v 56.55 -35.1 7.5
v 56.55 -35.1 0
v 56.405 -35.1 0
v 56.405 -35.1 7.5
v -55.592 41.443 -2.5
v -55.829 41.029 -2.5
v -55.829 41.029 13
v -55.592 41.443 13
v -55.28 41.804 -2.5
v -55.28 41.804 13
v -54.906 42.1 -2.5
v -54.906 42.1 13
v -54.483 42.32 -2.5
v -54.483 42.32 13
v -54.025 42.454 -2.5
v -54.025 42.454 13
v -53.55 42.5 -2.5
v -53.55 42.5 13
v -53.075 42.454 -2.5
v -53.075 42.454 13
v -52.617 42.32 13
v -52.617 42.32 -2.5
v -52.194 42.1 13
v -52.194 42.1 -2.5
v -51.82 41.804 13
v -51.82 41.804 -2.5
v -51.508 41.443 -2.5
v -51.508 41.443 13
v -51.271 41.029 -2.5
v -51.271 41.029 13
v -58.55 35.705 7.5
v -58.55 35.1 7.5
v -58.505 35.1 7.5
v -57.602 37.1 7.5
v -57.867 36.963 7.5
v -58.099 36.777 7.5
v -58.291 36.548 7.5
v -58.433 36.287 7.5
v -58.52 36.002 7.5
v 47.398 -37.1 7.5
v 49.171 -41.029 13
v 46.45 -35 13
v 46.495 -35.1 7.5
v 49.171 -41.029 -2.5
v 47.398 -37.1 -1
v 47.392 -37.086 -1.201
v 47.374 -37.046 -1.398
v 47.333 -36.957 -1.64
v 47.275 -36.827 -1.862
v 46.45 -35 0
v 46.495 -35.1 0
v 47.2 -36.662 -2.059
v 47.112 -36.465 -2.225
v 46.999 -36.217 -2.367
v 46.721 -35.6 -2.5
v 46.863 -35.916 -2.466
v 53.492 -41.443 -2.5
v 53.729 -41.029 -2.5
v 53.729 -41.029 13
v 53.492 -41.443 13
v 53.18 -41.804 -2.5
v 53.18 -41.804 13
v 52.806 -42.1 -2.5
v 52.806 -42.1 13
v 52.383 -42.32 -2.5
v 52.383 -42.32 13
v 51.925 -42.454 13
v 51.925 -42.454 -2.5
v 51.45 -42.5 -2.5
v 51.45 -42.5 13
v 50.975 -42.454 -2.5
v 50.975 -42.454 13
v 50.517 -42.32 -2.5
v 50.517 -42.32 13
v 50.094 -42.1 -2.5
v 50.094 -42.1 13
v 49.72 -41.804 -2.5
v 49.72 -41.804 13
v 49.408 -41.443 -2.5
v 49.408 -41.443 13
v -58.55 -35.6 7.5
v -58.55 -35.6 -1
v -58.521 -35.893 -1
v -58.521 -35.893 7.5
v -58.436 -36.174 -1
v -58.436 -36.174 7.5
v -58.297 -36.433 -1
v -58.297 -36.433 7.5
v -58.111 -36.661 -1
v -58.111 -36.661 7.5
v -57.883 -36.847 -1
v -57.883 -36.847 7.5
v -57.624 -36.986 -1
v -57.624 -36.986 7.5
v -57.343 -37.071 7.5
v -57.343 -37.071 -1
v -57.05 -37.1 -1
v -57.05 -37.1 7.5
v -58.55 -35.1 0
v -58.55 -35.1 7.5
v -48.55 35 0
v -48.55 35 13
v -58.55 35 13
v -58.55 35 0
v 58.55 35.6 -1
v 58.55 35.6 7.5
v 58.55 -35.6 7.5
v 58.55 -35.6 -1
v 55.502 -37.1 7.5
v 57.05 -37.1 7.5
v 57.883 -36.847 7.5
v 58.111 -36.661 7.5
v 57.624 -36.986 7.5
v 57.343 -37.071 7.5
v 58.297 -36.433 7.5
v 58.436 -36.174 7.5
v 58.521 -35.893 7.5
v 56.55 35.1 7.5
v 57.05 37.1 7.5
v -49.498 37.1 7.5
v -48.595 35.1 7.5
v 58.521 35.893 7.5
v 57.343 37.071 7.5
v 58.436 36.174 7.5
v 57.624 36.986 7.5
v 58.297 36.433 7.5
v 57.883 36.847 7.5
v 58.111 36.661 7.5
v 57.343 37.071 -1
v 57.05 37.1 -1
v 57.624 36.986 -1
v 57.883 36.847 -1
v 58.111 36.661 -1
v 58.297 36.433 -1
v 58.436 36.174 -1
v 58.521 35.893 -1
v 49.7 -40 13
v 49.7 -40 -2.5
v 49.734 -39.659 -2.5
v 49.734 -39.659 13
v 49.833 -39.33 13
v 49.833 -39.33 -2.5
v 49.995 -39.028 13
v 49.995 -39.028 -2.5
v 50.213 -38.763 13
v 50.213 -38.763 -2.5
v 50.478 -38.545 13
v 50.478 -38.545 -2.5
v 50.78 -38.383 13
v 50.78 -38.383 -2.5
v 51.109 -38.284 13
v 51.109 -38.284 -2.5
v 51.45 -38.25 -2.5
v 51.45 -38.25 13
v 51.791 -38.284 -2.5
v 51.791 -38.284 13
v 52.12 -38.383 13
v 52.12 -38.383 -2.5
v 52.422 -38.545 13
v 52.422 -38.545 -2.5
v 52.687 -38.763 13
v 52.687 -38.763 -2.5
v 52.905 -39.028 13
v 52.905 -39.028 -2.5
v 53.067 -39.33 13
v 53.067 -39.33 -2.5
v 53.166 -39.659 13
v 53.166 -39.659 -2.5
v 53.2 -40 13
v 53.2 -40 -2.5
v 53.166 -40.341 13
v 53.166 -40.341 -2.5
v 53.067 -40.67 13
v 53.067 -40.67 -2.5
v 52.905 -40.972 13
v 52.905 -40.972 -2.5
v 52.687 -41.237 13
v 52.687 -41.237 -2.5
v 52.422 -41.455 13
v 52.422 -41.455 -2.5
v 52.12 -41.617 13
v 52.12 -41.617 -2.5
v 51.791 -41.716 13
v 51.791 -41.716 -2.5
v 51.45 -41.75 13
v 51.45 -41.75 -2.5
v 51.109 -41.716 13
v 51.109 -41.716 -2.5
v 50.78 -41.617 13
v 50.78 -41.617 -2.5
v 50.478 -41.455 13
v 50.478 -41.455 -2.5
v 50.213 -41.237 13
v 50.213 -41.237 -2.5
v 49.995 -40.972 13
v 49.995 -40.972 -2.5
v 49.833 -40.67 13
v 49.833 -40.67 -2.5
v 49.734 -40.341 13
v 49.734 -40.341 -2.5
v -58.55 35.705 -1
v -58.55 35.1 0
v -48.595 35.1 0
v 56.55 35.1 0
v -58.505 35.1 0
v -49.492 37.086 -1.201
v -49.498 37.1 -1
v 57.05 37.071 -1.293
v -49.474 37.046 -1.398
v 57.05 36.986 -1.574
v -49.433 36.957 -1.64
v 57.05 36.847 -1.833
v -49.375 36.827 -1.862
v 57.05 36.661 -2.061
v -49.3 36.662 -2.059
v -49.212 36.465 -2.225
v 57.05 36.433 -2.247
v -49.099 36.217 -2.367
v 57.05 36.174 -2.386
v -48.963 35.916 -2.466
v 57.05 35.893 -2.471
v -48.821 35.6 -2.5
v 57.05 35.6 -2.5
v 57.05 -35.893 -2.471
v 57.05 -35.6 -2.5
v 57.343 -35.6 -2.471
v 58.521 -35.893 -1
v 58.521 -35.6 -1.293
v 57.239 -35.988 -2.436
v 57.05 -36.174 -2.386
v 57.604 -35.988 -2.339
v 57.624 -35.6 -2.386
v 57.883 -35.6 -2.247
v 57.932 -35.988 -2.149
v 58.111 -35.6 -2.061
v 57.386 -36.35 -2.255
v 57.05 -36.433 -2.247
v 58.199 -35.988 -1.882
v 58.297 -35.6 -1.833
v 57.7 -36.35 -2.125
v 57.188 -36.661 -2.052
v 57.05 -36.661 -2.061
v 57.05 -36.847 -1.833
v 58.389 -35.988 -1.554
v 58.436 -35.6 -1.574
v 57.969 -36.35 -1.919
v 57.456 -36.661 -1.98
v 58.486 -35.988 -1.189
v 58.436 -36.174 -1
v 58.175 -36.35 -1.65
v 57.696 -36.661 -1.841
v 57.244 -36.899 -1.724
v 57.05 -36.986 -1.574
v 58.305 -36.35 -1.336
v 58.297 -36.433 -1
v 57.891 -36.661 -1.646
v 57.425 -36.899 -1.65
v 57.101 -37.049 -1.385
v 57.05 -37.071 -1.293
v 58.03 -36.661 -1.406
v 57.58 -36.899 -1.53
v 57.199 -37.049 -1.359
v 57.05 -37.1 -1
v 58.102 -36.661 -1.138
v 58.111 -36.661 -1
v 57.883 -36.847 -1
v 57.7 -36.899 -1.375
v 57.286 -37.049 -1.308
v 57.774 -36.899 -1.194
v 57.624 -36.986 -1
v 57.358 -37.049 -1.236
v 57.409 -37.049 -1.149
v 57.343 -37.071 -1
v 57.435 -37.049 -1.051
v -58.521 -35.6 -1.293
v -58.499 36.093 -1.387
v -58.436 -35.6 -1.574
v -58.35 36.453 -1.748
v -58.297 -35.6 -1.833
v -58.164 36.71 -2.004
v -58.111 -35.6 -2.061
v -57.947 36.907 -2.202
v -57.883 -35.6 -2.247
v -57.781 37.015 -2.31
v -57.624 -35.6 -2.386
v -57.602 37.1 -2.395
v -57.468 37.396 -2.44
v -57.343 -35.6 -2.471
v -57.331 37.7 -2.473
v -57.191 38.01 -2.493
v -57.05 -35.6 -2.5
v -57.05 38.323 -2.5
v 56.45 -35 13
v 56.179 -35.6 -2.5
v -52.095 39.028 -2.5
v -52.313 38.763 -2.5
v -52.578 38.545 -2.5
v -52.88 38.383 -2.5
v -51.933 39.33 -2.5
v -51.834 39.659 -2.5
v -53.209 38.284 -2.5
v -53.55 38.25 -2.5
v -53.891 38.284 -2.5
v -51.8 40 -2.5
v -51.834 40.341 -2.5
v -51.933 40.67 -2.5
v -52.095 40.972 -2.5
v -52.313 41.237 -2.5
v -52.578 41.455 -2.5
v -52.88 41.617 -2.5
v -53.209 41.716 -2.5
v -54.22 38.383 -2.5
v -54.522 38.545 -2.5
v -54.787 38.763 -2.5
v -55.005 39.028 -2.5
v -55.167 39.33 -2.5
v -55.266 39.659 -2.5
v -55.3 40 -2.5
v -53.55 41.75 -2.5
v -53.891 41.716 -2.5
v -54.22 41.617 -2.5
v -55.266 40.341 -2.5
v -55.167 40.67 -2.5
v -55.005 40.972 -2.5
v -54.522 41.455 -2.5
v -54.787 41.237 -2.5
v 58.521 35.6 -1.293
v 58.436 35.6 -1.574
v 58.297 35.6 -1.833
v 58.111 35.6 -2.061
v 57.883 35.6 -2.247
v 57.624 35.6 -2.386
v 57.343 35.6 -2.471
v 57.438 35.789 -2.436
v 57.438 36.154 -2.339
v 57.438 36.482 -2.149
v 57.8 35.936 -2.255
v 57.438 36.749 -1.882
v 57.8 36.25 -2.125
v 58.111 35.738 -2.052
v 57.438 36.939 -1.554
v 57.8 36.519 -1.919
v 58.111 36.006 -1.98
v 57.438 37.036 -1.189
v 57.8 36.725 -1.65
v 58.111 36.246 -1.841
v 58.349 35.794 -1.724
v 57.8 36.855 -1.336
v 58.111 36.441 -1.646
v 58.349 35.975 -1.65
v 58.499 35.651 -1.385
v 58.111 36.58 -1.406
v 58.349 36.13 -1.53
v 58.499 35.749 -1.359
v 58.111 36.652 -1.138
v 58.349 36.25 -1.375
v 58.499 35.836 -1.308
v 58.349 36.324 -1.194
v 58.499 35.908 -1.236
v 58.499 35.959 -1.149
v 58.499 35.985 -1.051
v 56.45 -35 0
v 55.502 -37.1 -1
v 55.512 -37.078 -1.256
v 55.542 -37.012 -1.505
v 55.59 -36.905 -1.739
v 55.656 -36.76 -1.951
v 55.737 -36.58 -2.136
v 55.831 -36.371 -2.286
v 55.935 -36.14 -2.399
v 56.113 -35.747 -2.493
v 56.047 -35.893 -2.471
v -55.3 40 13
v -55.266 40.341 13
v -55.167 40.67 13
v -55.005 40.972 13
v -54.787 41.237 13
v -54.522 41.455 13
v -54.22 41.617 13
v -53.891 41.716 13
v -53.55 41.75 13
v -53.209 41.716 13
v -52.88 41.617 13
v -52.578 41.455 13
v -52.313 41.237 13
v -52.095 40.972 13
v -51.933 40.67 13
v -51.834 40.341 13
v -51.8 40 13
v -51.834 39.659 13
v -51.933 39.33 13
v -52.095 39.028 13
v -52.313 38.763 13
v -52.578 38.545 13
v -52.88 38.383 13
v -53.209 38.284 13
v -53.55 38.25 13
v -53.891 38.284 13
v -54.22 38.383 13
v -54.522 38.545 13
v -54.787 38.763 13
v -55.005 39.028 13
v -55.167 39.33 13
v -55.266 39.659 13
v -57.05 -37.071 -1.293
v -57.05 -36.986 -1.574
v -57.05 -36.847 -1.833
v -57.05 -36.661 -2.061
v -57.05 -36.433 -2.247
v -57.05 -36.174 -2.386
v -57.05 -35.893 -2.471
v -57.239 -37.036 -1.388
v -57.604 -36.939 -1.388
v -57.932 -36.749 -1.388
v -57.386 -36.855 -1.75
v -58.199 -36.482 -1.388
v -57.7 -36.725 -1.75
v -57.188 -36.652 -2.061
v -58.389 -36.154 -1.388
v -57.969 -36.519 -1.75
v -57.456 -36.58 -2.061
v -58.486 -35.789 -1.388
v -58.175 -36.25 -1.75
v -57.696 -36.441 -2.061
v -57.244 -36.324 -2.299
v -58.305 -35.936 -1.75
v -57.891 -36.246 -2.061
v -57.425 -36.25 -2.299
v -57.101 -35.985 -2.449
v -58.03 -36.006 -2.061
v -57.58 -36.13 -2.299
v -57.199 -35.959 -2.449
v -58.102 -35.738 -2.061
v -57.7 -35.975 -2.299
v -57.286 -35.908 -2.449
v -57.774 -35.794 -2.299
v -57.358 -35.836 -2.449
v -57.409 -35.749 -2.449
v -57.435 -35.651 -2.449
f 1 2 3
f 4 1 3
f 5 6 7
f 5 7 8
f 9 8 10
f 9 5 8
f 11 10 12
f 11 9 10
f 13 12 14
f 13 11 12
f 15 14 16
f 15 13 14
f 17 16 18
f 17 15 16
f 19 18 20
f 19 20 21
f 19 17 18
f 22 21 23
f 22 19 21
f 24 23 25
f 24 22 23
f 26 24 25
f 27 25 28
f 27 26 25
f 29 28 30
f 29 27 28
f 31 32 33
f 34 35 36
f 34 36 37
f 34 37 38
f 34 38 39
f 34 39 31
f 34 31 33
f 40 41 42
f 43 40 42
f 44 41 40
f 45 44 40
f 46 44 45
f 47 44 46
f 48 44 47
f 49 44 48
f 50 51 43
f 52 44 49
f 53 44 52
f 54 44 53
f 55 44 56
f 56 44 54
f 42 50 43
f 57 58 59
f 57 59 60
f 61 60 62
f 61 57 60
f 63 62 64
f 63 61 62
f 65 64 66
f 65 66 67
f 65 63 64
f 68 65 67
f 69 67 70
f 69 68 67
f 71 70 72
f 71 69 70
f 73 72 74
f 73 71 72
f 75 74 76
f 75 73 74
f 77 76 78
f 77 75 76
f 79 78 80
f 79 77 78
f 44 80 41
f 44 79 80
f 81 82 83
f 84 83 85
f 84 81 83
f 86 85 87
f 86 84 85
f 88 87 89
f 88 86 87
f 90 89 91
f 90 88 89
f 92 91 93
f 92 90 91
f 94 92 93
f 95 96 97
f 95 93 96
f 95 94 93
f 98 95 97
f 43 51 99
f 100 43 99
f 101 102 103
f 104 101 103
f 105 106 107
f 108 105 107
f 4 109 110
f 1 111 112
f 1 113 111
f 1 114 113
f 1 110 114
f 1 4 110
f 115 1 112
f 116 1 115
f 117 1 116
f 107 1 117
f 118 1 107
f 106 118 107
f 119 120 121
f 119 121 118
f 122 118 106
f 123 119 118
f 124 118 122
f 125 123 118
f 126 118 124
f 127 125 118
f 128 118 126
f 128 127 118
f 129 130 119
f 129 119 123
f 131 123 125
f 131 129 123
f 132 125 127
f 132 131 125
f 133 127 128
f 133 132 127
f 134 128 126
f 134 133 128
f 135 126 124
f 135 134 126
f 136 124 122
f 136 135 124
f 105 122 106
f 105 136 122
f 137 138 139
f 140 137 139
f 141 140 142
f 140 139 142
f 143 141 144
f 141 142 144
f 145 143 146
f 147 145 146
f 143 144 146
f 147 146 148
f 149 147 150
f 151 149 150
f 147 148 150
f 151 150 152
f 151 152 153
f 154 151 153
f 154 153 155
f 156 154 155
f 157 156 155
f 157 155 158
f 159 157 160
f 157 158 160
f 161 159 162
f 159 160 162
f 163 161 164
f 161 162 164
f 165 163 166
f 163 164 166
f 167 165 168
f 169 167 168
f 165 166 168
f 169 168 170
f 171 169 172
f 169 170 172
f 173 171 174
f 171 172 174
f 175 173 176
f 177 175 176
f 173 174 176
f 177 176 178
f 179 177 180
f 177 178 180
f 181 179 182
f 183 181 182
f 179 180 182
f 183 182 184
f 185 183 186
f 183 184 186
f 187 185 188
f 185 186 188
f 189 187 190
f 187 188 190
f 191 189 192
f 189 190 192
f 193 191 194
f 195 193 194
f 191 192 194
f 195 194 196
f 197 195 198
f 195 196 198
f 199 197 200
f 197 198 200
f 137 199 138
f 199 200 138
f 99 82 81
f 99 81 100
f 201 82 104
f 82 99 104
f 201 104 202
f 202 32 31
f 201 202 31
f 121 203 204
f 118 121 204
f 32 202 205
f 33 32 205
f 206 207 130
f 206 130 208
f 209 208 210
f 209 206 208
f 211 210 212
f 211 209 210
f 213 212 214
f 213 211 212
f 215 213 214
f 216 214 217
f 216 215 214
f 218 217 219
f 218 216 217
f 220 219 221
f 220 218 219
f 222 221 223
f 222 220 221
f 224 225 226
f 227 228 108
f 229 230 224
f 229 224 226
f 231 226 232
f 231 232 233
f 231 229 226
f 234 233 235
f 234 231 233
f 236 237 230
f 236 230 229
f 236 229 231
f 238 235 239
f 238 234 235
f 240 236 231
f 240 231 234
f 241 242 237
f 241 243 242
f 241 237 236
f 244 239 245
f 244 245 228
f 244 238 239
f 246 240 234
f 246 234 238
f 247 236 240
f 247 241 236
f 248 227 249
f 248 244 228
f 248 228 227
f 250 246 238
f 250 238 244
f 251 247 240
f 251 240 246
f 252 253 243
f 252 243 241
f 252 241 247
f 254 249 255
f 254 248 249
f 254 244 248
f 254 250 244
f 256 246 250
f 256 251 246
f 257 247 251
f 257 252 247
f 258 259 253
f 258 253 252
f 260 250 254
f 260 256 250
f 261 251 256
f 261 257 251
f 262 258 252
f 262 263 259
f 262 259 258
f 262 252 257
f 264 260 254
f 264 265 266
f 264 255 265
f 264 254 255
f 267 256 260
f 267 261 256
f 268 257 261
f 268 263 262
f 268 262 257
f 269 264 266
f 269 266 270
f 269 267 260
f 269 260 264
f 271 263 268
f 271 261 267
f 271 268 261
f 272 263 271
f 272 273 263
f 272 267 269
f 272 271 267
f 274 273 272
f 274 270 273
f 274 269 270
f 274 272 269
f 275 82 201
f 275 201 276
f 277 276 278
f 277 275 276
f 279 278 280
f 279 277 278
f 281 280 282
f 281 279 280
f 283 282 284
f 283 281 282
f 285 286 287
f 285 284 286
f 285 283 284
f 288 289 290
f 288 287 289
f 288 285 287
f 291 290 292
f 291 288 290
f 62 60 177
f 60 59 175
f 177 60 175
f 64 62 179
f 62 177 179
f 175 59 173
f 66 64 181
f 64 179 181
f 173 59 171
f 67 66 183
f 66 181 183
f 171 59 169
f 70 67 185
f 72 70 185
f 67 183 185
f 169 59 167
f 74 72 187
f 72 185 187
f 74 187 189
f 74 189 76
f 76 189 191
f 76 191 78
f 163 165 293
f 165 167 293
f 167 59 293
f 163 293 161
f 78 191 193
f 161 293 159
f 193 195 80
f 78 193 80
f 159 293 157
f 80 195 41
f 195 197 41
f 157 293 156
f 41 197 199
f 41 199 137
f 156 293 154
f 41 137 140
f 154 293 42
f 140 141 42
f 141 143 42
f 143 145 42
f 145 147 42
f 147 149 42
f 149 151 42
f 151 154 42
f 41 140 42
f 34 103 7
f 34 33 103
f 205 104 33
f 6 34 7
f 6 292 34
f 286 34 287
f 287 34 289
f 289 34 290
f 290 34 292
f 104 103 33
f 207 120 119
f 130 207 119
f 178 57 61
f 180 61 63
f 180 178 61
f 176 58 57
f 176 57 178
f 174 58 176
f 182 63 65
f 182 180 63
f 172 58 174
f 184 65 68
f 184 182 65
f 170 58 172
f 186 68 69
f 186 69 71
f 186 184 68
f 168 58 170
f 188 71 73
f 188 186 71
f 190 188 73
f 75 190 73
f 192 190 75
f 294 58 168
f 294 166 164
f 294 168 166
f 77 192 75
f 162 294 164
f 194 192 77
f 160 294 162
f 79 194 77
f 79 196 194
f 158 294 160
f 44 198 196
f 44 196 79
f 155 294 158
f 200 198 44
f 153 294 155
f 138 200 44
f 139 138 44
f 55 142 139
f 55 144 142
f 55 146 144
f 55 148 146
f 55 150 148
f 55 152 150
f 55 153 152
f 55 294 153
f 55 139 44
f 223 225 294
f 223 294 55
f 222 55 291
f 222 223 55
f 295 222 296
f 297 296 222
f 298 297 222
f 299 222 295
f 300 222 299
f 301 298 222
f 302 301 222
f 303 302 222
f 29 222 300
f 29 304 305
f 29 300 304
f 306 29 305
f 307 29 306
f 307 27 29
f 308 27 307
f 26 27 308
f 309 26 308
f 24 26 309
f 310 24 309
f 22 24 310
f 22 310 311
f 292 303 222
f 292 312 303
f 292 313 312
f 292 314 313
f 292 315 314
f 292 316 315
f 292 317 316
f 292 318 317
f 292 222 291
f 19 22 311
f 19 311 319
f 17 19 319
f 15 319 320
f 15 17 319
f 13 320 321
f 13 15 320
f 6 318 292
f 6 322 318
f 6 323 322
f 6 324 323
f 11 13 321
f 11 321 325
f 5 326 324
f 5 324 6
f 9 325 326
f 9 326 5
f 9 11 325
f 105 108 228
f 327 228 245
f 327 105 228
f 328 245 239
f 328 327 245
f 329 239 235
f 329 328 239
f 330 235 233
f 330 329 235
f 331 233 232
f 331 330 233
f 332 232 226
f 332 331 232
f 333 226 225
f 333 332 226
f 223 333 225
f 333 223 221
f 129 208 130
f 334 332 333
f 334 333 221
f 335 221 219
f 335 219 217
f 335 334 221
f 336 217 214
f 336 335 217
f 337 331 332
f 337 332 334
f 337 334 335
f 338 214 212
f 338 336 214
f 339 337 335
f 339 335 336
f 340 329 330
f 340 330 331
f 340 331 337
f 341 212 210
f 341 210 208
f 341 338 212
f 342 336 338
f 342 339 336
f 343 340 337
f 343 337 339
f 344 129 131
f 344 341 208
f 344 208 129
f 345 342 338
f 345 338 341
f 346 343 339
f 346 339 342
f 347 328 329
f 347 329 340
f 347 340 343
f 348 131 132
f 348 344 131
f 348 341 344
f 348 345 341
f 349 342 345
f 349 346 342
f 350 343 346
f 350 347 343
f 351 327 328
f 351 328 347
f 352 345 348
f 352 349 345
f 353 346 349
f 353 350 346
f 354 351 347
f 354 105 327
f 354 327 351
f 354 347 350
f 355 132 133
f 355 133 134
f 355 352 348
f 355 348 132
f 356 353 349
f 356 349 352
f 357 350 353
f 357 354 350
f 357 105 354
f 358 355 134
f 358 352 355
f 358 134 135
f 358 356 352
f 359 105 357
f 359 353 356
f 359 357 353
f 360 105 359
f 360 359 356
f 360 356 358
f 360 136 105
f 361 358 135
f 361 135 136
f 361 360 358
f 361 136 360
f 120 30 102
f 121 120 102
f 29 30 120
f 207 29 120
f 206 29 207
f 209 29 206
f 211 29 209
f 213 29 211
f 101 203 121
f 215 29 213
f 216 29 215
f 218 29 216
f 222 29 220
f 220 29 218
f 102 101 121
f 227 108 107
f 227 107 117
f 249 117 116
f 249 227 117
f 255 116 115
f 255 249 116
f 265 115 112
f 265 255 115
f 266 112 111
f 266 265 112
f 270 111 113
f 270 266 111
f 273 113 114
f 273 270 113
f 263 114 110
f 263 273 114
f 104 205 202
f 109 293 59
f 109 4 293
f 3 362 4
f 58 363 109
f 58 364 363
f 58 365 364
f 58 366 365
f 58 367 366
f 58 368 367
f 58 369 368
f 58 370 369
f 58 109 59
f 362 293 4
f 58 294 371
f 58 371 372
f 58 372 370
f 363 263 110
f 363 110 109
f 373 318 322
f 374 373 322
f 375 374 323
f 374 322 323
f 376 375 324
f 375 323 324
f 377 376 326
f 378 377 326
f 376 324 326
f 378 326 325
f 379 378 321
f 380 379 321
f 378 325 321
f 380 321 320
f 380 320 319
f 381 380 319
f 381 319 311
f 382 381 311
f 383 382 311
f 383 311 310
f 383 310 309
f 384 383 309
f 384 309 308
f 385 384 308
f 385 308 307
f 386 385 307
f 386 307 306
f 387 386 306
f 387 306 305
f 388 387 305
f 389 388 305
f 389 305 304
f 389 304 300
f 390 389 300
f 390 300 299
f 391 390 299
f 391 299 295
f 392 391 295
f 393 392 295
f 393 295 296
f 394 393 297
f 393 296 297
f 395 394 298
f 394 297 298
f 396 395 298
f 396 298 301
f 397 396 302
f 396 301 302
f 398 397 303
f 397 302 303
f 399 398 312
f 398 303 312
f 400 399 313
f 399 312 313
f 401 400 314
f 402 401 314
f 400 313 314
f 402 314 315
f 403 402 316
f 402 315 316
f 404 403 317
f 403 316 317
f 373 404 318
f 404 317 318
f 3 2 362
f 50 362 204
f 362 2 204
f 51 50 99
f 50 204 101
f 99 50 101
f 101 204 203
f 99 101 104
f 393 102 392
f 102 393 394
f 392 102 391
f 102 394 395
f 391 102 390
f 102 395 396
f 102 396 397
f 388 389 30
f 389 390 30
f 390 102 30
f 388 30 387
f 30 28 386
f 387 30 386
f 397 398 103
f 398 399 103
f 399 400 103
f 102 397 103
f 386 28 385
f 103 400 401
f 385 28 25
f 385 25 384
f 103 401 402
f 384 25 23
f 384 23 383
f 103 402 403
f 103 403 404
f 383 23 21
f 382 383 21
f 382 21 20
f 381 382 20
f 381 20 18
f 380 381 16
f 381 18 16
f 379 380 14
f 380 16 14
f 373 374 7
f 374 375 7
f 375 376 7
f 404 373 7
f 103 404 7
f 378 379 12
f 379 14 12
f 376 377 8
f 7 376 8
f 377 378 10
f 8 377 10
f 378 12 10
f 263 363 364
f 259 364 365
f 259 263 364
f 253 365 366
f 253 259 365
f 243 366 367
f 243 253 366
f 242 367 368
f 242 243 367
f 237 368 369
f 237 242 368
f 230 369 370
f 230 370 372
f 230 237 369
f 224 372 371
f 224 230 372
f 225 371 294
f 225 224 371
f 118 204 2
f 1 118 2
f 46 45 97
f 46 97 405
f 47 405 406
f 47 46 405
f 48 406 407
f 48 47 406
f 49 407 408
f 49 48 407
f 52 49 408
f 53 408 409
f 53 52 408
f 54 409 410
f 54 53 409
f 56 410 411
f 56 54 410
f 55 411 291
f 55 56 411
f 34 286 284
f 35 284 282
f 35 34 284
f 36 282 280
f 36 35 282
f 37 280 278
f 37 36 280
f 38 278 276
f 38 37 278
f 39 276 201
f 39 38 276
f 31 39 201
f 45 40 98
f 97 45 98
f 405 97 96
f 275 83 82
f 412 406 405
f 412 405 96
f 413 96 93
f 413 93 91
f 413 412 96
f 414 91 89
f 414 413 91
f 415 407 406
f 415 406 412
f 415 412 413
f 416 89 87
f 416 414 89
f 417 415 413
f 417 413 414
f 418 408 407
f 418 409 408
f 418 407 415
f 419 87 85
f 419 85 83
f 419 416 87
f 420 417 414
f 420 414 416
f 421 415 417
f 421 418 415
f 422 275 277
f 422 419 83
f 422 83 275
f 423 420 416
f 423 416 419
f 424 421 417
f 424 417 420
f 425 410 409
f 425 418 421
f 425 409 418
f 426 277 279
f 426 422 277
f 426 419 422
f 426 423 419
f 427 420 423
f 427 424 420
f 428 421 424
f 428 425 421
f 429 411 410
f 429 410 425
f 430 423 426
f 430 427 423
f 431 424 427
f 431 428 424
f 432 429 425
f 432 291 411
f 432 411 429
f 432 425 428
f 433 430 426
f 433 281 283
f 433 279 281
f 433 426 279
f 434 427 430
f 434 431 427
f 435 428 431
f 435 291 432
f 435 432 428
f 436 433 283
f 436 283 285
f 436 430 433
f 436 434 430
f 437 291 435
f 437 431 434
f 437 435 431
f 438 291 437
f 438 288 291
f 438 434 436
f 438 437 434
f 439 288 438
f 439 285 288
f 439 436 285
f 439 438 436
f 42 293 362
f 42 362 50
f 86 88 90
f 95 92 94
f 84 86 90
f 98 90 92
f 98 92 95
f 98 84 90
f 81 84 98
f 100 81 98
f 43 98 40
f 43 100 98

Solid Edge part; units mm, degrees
sketch "Sketch1" plane through (0, 0, 0) normal (0, 0, 1) x (1, 0, 0)
  line L0 (58.55, -37.1) -> (-58.55, -37.1)
  line L1 (-58.55, -37.1) -> (-58.55, 37.1)
  line L2 (-58.55, 37.1) -> (58.55, 37.1)
  line L3 (58.55, 37.1) -> (58.55, -37.1)
extrude "Protrusion1" add sketch "Sketch1" against normal blind 2.5
sketch "Sketch2" plane through (0, 0, 0) normal (0, 0, 1) x (1, 0, 0)
  line L0 (56.55, -35.1) -> (-58.55, -35.1)
  line L1 (-58.55, -35.1) -> (-58.55, -37.1)
  line L2 (-58.55, -37.1) -> (58.55, -37.1)
  line L3 (58.55, -37.1) -> (58.55, 37.1)
  line L4 (58.55, 37.1) -> (-58.55, 37.1)
  line L5 (-58.55, 37.1) -> (-58.55, 35.1)
  line L6 (-58.55, 35.1) -> (56.55, 35.1)
  line L7 (56.55, 35.1) -> (56.55, -35.1)
extrude "ExtrudedProtrusion_2" add sketch "Sketch2" along normal blind 7.5
sketch "Sketch3" plane through (0, 0, -2.5) normal (0, 0, -1) x (-1, 0, 0)
  line L0 (-49.1714, -41.0286) -> (-46.45, -35)
  line L1 (-56.45, -35) -> (-46.45, -35)
  line L2 (-56.45, -35) -> (-53.7286, -41.0286)
  arc A0 (-53.7286, -41.0286) -> (-49.1714, -41.0286) centre (-51.45, -40) ccw
  circle A1 centre (-51.45, -40) radius 1.75
  circle A2 centre (53.55, 40) radius 1.75
  line L3 (58.55, 35) -> (55.8286, 41.0286)
  arc A3 (55.8286, 41.0286) -> (51.2714, 41.0286) centre (53.55, 40) ccw
  line L4 (51.2714, 41.0286) -> (48.55, 35)
  line L5 (48.55, 35) -> (58.55, 35)
extrude "Protrusion2" add sketch "Sketch3" against normal up to vertex (15.5 mm away)
fillet "Round_1" radius 1.5 9 edges at (58.55, -37.1, 2.5) (58.55, 37.1, 2.5) (58.55, 0, -2.5) (4.526, 37.1, -2.5) (-5.576, -37.1, -2.5) (57.026, -37.1, -2.5) (-58.55, 0, -2.5) (-58.55, 37.1, 2.5) (-58.55, -37.1, 2.5)
